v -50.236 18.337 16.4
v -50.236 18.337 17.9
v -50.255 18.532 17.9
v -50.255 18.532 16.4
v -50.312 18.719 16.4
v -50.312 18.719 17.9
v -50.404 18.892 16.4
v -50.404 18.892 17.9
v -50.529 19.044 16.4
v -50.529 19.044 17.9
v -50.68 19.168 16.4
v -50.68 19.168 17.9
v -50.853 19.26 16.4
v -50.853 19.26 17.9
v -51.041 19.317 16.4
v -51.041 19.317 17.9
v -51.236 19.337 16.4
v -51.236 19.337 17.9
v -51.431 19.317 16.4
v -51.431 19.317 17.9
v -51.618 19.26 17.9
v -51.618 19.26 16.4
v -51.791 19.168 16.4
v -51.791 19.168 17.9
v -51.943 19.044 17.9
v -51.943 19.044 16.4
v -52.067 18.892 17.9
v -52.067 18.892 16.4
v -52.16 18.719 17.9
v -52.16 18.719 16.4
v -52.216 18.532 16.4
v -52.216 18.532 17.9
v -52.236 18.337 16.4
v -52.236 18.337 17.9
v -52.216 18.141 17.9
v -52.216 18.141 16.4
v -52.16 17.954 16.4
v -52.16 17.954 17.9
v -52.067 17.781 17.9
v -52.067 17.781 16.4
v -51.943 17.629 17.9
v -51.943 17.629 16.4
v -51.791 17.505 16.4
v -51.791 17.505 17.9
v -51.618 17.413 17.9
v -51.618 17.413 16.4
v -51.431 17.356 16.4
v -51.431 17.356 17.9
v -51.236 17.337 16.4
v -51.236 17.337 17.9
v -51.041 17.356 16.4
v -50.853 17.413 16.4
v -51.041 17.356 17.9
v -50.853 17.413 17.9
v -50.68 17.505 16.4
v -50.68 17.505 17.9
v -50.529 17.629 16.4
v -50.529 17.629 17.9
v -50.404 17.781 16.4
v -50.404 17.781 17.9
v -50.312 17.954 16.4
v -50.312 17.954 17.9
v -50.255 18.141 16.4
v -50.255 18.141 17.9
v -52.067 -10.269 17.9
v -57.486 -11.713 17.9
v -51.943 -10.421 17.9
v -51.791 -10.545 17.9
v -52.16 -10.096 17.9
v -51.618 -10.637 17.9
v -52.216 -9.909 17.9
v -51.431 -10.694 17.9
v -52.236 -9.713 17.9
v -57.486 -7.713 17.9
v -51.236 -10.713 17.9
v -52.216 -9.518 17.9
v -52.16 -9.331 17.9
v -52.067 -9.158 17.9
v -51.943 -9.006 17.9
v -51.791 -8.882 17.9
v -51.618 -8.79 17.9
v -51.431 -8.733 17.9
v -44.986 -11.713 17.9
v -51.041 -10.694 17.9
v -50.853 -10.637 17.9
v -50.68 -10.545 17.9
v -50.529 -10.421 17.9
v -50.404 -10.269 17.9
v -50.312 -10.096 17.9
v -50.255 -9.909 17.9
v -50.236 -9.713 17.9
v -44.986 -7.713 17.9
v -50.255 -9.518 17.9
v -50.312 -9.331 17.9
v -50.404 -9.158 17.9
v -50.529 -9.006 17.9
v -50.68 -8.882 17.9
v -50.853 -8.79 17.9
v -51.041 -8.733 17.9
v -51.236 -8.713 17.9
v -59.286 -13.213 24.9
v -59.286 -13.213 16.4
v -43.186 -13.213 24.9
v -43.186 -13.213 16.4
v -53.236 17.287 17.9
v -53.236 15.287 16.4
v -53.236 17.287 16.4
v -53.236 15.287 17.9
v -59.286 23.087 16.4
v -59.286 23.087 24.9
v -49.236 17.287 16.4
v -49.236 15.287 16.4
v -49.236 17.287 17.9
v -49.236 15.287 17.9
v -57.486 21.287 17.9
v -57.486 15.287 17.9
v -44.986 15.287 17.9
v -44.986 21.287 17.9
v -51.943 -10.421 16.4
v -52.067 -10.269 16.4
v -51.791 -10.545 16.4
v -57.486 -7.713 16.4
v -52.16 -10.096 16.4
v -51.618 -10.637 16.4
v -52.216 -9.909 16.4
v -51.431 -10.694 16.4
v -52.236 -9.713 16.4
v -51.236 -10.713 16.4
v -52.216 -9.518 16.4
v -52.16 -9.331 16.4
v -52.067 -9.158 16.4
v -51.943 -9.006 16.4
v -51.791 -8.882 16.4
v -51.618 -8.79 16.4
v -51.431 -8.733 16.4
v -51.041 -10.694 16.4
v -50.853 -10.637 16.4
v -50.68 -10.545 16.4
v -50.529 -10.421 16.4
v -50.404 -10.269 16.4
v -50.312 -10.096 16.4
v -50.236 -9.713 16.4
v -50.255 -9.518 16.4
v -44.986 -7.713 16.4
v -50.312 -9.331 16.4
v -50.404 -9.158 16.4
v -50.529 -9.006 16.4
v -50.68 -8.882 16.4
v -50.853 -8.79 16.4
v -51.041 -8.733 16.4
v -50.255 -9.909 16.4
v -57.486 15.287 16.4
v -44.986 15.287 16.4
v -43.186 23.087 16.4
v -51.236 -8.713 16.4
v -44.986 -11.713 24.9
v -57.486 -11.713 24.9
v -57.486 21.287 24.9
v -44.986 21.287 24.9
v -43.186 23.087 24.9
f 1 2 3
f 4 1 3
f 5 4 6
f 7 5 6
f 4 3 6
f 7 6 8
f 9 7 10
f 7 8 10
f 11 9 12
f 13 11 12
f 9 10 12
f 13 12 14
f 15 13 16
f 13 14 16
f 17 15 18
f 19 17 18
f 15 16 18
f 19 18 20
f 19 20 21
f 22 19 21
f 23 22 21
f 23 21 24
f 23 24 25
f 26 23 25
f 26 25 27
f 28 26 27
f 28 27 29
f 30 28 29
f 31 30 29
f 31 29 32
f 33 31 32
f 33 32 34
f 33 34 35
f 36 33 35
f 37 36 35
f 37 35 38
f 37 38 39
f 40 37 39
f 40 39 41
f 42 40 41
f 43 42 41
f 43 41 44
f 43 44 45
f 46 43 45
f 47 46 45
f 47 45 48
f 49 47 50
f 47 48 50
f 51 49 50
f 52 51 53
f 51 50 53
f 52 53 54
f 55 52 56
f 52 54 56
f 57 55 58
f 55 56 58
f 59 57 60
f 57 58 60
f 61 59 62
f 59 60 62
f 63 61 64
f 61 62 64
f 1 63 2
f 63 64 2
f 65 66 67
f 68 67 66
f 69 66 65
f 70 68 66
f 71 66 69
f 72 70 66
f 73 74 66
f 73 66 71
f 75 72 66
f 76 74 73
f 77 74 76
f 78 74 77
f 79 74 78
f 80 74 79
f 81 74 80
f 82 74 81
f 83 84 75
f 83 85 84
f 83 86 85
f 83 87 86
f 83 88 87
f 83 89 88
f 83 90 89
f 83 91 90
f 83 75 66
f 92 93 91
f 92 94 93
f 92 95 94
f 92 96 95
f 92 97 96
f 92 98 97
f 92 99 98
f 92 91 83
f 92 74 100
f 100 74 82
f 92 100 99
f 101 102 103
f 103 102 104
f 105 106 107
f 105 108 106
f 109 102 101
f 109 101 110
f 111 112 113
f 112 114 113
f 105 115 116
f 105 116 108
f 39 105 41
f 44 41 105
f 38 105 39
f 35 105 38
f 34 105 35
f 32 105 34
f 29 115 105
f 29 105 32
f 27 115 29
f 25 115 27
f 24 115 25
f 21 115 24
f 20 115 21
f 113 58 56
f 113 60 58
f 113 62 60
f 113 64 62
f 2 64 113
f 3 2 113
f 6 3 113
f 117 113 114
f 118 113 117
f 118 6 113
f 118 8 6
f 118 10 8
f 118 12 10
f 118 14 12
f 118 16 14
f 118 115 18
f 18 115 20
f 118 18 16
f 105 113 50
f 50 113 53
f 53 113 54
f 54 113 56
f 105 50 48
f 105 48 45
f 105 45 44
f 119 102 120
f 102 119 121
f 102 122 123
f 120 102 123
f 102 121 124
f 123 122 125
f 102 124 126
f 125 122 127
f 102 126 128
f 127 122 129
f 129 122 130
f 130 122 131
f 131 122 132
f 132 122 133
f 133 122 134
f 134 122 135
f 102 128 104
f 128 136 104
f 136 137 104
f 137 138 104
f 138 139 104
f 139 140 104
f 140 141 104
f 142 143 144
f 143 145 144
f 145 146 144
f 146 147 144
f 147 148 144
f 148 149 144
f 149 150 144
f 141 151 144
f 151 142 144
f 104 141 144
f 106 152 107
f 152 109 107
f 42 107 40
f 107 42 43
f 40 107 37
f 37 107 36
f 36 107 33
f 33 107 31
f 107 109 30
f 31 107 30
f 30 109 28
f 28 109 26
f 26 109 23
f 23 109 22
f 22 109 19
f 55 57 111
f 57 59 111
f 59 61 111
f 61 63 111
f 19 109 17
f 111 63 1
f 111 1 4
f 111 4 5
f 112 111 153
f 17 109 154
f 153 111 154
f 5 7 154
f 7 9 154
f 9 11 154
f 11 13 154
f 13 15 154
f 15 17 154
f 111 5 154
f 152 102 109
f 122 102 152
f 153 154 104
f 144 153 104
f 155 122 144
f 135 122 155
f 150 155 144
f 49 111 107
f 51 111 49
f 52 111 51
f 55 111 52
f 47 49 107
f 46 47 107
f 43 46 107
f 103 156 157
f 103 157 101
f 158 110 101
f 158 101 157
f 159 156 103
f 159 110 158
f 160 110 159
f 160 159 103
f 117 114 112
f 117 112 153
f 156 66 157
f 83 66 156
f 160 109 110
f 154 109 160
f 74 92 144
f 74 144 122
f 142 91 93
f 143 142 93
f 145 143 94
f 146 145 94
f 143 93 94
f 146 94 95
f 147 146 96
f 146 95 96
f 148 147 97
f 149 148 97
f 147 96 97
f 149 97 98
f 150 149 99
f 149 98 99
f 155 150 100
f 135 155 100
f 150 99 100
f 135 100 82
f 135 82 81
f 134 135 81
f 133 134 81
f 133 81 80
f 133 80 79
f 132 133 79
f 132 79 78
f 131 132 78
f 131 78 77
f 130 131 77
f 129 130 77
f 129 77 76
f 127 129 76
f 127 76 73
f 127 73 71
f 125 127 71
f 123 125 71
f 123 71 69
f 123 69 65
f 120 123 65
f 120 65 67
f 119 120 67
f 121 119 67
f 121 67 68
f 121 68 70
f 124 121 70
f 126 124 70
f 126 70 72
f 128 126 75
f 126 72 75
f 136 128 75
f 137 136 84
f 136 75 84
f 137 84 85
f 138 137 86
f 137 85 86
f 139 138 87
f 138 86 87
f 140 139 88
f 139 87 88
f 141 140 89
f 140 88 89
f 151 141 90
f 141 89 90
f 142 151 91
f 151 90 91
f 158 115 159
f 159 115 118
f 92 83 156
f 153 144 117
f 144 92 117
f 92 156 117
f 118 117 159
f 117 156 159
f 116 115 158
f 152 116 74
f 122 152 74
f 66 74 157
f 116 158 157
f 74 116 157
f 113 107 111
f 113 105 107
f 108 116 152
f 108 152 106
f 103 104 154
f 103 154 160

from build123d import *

# Parameters (mm, degrees)
CROQUIS1_R              = 31.5
SALIENTE_EXTRUIR1_DEPTH = 2.4
CROQUIS2_W              = 16.1
CROQUIS2_H              = 36.3
CROQUIS2_W_2            = 12.5
CROQUIS2_H_2            = 33
SALIENTE_EXTRUIR2_DEPTH = 22.5
CROQUIS5_W              = 16.1
CROQUIS5_H              = 36.3
CORTAR_EXTRUIR2_DEPTH   = 9
CROQUIS6_R              = 1.5
CORTAR_EXTRUIR3_DEPTH   = 2.4
CROQUIS7_W              = 12.5
CROQUIS7_H              = 9
SALIENTE_EXTRUIR3_DEPTH = 33
CROQUIS8_R              = 1
CORTAR_EXTRUIR5_DEPTH   = 9
SALIENTE_EXTRUIR4_DEPTH = 12.5
CROQUIS10_W             = 4
CROQUIS10_H             = 2
CORTAR_EXTRUIR6_DEPTH   = 9
SALIENTE_EXTRUIR5_DEPTH = 2.4
SALIENTE_EXTRUIR6_DEPTH = 16.099998
CORTAR_EXTRUIR7_DEPTH   = 1.8
CROQUIS14_R             = 1.5
SALIENTE_EXTRUIR7_DEPTH = 0.6
CORTAR_EXTRUIR8_START   = -17
CROQUIS17_R             = 41.453169239
CORTAR_EXTRUIR8_DEPTH   = 17


with BuildPart() as part:
    # Croquis1 → Saliente-Extruir1 (new body)
    with BuildSketch(Plane.XY):
        with Locations((-51.235671923, 9.786589019)):
            Circle(CROQUIS1_R)
    extrude(amount=SALIENTE_EXTRUIR1_DEPTH)

    # Croquis2 → Saliente-Extruir2 (add)
    with BuildSketch(Plane.XY.offset(2.4)):
        with Locations((-51.235671923, 4.936589019)):
            Rectangle(CROQUIS2_W, CROQUIS2_H)
        with Locations((-51.235671923, 4.786589019)):
            Rectangle(CROQUIS2_W_2, CROQUIS2_H_2, mode=Mode.SUBTRACT)
    extrude(amount=SALIENTE_EXTRUIR2_DEPTH)

    # Croquis5 → Cortar-Extruir2 (cut)
    with BuildSketch(Plane.XY.offset(2.4)):
        with Locations((-51.235671923, 4.936589019)):
            Rectangle(CROQUIS5_W, CROQUIS5_H)
    extrude(amount=-CORTAR_EXTRUIR2_DEPTH, mode=Mode.SUBTRACT)


with BuildPart() as cortar_extruir2_piece_1:
    # of the separate pieces the step leaves, piece 1, a body of its own (cortar_extruir2_pieces)
    add(part.part.solids().sort_by_distance((-19.735671923, 9.786589019, 0))[0])

    # Croquis6 → Cortar-Extruir3 (cut)
    with BuildSketch(Plane(origin=(0, 0, 0), x_dir=(-1, 0, 0), z_dir=(0, 0, -1))):
        with Locations((34.618662565, 26.403598377)):
            Circle(CROQUIS6_R)
        with Locations((67.85268128, 26.403598377)):
            Circle(CROQUIS6_R)
        with Locations((67.85268128, -6.830420339)):
            Circle(CROQUIS6_R)
        with Locations((34.618662565, -6.830420339)):
            Circle(CROQUIS6_R)
        Polygon((51.235671923, 23.086589019), (53.235671923, 23.086589019), (53.235671923, 43.086589019), (49.235671923, 43.086589019), (49.235671923, 23.086589019), align=None)
    extrude(amount=-CORTAR_EXTRUIR3_DEPTH, mode=Mode.SUBTRACT)



with BuildPart() as cortar_extruir2_piece_2:
    # of the separate pieces the step leaves, piece 2, a body of its own (cortar_extruir2_pieces)
    add(part.part.solids().sort_by_distance((-59.285671923, -13.213410981, 24.9))[0])

    # Croquis7 → Saliente-Extruir3 (add)
    with BuildSketch(Plane.XZ.offset(-21.286589019)):
        with Locations((-51.235671923, 13.4)):
            Rectangle(CROQUIS7_W, CROQUIS7_H)
    extrude(amount=SALIENTE_EXTRUIR3_DEPTH)

    # Croquis8 → Cortar-Extruir5 (cut)
    with BuildSketch(Plane.XY.offset(17.9)):
        with Locations((-51.235671923, -9.713410981)):
            Circle(CROQUIS8_R)
        with Locations((-51.235671923, 18.336589019)):
            Circle(CROQUIS8_R)
        Polygon((-44.985671923, -7.713410981), (-57.485671923, -7.713410981), (-57.485671923, 15.286589019), (-53.235671923, 15.286589019), (-53.235671923, 17.286589019), (-49.235671923, 17.286589019), (-49.235671923, 15.286589019), (-44.985671923, 15.286589019), align=None)
    extrude(amount=-CORTAR_EXTRUIR5_DEPTH, mode=Mode.SUBTRACT)

    # Croquis9 → Saliente-Extruir4 (add)
    with BuildSketch(Plane.ZY.offset(44.985671923)):
        Polygon((8.9, -7.713410981), (3.9, -11.713410981), (8.9, -11.713410981), align=None)
        Polygon((8.9, 15.286589019), (4.1, 21.286589019), (8.9, 21.286589019), align=None)
    extrude(amount=SALIENTE_EXTRUIR4_DEPTH)

    # Croquis10 → Cortar-Extruir6 (cut)
    with BuildSketch(Plane.XY.offset(8.9)):
        with Locations((-51.235671923, 16.286589019)):
            Rectangle(CROQUIS10_W, CROQUIS10_H)
    extrude(amount=-CORTAR_EXTRUIR6_DEPTH, mode=Mode.SUBTRACT)


with BuildPart() as cortar_extruir2_piece_1_1:
    add(cortar_extruir2_piece_1.part)

    add(cortar_extruir2_piece_2.part)  # Saliente-Extruir5 merges Cortar-Extruir2 piece 2
    # Croquis11 → Saliente-Extruir5 (add)
    with BuildSketch(Plane(origin=(0, 0, 2.4), x_dir=(-1, 0, 0), z_dir=(0, 0, -1))):
        Polygon((49.235671923, 23.086589019), (43.185671923, 23.086589019), (43.185671923, -13.213410981), (59.285671923, -13.213410981), (59.285671923, 23.086589019), (53.235671923, 23.086589019), (53.235671923, 21.286589019), (57.485671923, 21.286589019), (57.485671923, 10.586589019), (44.985671923, 10.586589019), (44.985671923, 21.286589019), (49.235671923, 21.286589019), align=None)
    extrude(amount=SALIENTE_EXTRUIR5_DEPTH)

    # Croquis12 → Saliente-Extruir6 (add)
    with BuildSketch(Plane(origin=(-43.185671923, 0, 0), x_dir=(0, 0, -1), z_dir=(1, 0, 0))):
        Polygon((-2.4, 23.086589019), (-7.4, 23.086589019), (-2.4, 29.386589019), align=None)
    extrude(amount=-SALIENTE_EXTRUIR6_DEPTH)

    # Croquis13 → Cortar-Extruir7 (cut)
    with BuildSketch(Plane.XY.offset(2.4)):
        Polygon((-31.385501057, -6.830420339), (-33.002081811, -4.030420339), (-36.235243318, -4.030420339), (-37.851824072, -6.830420339), (-36.235243318, -9.630420339), (-33.002081811, -9.630420339), align=None)
        Polygon((-64.619519773, -6.830420339), (-66.236100527, -4.030420339), (-69.469262034, -4.030420339), (-71.085842788, -6.830420339), (-69.469262034, -9.630420339), (-66.236100527, -9.630420339), align=None)
        Polygon((-37.851824072, 26.403598377), (-36.235243318, 23.603598377), (-33.002081811, 23.603598377), (-31.385501057, 26.403598377), (-33.002081811, 29.203598377), (-36.235243318, 29.203598377), align=None)
        Polygon((-71.085842788, 26.403598377), (-69.469262034, 23.603598377), (-66.236100527, 23.603598377), (-64.619519773, 26.403598377), (-66.236100527, 29.203598377), (-69.469262034, 29.203598377), align=None)
    extrude(amount=-CORTAR_EXTRUIR7_DEPTH, mode=Mode.SUBTRACT)

    # Croquis14 → Saliente-Extruir7 (add)
    with BuildSketch(Plane(origin=(0, 0, 0), x_dir=(-1, 0, 0), z_dir=(0, 0, -1))):
        with BuildLine():
            Line((53.235671923, 41.223032838), (53.235671923, 21.286589019))
            Line((53.235671923, 21.286589019), (57.485671923, 21.286589019))
            Line((57.485671923, 21.286589019), (57.485671923, 10.586589019))
            Line((57.485671923, 10.586589019), (44.985671923, 10.586589019))
            Line((44.985671923, 10.586589019), (44.985671923, 21.286589019))
            Line((44.985671923, 21.286589019), (49.235671923, 21.286589019))
            Line((49.235671923, 21.286589019), (49.235671923, 41.223032838))
            ThreePointArc((49.235671923, 41.223032838), (51.235671923, -21.713410981), (53.235671923, 41.223032838))
        make_face()
        with Locations((67.85268128, -6.830420339)):
            Circle(CROQUIS14_R, mode=Mode.SUBTRACT)
        with Locations((34.618662565, -6.830420339)):
            Circle(CROQUIS14_R, mode=Mode.SUBTRACT)
        with Locations((34.618662565, 26.403598377)):
            Circle(CROQUIS14_R, mode=Mode.SUBTRACT)
        with Locations((67.85268128, 26.403598377)):
            Circle(CROQUIS14_R, mode=Mode.SUBTRACT)
    extrude(amount=SALIENTE_EXTRUIR7_DEPTH)

    # Croquis17 → Cortar-Extruir8 (cut)
    with BuildSketch(Plane.XY.offset(16.4).offset(CORTAR_EXTRUIR8_START)):
        with Locations((-51.749775456, 10.131791007)):
            Circle(CROQUIS17_R)
    extrude(amount=CORTAR_EXTRUIR8_DEPTH, mode=Mode.SUBTRACT)


solid = cortar_extruir2_piece_1_1.part
